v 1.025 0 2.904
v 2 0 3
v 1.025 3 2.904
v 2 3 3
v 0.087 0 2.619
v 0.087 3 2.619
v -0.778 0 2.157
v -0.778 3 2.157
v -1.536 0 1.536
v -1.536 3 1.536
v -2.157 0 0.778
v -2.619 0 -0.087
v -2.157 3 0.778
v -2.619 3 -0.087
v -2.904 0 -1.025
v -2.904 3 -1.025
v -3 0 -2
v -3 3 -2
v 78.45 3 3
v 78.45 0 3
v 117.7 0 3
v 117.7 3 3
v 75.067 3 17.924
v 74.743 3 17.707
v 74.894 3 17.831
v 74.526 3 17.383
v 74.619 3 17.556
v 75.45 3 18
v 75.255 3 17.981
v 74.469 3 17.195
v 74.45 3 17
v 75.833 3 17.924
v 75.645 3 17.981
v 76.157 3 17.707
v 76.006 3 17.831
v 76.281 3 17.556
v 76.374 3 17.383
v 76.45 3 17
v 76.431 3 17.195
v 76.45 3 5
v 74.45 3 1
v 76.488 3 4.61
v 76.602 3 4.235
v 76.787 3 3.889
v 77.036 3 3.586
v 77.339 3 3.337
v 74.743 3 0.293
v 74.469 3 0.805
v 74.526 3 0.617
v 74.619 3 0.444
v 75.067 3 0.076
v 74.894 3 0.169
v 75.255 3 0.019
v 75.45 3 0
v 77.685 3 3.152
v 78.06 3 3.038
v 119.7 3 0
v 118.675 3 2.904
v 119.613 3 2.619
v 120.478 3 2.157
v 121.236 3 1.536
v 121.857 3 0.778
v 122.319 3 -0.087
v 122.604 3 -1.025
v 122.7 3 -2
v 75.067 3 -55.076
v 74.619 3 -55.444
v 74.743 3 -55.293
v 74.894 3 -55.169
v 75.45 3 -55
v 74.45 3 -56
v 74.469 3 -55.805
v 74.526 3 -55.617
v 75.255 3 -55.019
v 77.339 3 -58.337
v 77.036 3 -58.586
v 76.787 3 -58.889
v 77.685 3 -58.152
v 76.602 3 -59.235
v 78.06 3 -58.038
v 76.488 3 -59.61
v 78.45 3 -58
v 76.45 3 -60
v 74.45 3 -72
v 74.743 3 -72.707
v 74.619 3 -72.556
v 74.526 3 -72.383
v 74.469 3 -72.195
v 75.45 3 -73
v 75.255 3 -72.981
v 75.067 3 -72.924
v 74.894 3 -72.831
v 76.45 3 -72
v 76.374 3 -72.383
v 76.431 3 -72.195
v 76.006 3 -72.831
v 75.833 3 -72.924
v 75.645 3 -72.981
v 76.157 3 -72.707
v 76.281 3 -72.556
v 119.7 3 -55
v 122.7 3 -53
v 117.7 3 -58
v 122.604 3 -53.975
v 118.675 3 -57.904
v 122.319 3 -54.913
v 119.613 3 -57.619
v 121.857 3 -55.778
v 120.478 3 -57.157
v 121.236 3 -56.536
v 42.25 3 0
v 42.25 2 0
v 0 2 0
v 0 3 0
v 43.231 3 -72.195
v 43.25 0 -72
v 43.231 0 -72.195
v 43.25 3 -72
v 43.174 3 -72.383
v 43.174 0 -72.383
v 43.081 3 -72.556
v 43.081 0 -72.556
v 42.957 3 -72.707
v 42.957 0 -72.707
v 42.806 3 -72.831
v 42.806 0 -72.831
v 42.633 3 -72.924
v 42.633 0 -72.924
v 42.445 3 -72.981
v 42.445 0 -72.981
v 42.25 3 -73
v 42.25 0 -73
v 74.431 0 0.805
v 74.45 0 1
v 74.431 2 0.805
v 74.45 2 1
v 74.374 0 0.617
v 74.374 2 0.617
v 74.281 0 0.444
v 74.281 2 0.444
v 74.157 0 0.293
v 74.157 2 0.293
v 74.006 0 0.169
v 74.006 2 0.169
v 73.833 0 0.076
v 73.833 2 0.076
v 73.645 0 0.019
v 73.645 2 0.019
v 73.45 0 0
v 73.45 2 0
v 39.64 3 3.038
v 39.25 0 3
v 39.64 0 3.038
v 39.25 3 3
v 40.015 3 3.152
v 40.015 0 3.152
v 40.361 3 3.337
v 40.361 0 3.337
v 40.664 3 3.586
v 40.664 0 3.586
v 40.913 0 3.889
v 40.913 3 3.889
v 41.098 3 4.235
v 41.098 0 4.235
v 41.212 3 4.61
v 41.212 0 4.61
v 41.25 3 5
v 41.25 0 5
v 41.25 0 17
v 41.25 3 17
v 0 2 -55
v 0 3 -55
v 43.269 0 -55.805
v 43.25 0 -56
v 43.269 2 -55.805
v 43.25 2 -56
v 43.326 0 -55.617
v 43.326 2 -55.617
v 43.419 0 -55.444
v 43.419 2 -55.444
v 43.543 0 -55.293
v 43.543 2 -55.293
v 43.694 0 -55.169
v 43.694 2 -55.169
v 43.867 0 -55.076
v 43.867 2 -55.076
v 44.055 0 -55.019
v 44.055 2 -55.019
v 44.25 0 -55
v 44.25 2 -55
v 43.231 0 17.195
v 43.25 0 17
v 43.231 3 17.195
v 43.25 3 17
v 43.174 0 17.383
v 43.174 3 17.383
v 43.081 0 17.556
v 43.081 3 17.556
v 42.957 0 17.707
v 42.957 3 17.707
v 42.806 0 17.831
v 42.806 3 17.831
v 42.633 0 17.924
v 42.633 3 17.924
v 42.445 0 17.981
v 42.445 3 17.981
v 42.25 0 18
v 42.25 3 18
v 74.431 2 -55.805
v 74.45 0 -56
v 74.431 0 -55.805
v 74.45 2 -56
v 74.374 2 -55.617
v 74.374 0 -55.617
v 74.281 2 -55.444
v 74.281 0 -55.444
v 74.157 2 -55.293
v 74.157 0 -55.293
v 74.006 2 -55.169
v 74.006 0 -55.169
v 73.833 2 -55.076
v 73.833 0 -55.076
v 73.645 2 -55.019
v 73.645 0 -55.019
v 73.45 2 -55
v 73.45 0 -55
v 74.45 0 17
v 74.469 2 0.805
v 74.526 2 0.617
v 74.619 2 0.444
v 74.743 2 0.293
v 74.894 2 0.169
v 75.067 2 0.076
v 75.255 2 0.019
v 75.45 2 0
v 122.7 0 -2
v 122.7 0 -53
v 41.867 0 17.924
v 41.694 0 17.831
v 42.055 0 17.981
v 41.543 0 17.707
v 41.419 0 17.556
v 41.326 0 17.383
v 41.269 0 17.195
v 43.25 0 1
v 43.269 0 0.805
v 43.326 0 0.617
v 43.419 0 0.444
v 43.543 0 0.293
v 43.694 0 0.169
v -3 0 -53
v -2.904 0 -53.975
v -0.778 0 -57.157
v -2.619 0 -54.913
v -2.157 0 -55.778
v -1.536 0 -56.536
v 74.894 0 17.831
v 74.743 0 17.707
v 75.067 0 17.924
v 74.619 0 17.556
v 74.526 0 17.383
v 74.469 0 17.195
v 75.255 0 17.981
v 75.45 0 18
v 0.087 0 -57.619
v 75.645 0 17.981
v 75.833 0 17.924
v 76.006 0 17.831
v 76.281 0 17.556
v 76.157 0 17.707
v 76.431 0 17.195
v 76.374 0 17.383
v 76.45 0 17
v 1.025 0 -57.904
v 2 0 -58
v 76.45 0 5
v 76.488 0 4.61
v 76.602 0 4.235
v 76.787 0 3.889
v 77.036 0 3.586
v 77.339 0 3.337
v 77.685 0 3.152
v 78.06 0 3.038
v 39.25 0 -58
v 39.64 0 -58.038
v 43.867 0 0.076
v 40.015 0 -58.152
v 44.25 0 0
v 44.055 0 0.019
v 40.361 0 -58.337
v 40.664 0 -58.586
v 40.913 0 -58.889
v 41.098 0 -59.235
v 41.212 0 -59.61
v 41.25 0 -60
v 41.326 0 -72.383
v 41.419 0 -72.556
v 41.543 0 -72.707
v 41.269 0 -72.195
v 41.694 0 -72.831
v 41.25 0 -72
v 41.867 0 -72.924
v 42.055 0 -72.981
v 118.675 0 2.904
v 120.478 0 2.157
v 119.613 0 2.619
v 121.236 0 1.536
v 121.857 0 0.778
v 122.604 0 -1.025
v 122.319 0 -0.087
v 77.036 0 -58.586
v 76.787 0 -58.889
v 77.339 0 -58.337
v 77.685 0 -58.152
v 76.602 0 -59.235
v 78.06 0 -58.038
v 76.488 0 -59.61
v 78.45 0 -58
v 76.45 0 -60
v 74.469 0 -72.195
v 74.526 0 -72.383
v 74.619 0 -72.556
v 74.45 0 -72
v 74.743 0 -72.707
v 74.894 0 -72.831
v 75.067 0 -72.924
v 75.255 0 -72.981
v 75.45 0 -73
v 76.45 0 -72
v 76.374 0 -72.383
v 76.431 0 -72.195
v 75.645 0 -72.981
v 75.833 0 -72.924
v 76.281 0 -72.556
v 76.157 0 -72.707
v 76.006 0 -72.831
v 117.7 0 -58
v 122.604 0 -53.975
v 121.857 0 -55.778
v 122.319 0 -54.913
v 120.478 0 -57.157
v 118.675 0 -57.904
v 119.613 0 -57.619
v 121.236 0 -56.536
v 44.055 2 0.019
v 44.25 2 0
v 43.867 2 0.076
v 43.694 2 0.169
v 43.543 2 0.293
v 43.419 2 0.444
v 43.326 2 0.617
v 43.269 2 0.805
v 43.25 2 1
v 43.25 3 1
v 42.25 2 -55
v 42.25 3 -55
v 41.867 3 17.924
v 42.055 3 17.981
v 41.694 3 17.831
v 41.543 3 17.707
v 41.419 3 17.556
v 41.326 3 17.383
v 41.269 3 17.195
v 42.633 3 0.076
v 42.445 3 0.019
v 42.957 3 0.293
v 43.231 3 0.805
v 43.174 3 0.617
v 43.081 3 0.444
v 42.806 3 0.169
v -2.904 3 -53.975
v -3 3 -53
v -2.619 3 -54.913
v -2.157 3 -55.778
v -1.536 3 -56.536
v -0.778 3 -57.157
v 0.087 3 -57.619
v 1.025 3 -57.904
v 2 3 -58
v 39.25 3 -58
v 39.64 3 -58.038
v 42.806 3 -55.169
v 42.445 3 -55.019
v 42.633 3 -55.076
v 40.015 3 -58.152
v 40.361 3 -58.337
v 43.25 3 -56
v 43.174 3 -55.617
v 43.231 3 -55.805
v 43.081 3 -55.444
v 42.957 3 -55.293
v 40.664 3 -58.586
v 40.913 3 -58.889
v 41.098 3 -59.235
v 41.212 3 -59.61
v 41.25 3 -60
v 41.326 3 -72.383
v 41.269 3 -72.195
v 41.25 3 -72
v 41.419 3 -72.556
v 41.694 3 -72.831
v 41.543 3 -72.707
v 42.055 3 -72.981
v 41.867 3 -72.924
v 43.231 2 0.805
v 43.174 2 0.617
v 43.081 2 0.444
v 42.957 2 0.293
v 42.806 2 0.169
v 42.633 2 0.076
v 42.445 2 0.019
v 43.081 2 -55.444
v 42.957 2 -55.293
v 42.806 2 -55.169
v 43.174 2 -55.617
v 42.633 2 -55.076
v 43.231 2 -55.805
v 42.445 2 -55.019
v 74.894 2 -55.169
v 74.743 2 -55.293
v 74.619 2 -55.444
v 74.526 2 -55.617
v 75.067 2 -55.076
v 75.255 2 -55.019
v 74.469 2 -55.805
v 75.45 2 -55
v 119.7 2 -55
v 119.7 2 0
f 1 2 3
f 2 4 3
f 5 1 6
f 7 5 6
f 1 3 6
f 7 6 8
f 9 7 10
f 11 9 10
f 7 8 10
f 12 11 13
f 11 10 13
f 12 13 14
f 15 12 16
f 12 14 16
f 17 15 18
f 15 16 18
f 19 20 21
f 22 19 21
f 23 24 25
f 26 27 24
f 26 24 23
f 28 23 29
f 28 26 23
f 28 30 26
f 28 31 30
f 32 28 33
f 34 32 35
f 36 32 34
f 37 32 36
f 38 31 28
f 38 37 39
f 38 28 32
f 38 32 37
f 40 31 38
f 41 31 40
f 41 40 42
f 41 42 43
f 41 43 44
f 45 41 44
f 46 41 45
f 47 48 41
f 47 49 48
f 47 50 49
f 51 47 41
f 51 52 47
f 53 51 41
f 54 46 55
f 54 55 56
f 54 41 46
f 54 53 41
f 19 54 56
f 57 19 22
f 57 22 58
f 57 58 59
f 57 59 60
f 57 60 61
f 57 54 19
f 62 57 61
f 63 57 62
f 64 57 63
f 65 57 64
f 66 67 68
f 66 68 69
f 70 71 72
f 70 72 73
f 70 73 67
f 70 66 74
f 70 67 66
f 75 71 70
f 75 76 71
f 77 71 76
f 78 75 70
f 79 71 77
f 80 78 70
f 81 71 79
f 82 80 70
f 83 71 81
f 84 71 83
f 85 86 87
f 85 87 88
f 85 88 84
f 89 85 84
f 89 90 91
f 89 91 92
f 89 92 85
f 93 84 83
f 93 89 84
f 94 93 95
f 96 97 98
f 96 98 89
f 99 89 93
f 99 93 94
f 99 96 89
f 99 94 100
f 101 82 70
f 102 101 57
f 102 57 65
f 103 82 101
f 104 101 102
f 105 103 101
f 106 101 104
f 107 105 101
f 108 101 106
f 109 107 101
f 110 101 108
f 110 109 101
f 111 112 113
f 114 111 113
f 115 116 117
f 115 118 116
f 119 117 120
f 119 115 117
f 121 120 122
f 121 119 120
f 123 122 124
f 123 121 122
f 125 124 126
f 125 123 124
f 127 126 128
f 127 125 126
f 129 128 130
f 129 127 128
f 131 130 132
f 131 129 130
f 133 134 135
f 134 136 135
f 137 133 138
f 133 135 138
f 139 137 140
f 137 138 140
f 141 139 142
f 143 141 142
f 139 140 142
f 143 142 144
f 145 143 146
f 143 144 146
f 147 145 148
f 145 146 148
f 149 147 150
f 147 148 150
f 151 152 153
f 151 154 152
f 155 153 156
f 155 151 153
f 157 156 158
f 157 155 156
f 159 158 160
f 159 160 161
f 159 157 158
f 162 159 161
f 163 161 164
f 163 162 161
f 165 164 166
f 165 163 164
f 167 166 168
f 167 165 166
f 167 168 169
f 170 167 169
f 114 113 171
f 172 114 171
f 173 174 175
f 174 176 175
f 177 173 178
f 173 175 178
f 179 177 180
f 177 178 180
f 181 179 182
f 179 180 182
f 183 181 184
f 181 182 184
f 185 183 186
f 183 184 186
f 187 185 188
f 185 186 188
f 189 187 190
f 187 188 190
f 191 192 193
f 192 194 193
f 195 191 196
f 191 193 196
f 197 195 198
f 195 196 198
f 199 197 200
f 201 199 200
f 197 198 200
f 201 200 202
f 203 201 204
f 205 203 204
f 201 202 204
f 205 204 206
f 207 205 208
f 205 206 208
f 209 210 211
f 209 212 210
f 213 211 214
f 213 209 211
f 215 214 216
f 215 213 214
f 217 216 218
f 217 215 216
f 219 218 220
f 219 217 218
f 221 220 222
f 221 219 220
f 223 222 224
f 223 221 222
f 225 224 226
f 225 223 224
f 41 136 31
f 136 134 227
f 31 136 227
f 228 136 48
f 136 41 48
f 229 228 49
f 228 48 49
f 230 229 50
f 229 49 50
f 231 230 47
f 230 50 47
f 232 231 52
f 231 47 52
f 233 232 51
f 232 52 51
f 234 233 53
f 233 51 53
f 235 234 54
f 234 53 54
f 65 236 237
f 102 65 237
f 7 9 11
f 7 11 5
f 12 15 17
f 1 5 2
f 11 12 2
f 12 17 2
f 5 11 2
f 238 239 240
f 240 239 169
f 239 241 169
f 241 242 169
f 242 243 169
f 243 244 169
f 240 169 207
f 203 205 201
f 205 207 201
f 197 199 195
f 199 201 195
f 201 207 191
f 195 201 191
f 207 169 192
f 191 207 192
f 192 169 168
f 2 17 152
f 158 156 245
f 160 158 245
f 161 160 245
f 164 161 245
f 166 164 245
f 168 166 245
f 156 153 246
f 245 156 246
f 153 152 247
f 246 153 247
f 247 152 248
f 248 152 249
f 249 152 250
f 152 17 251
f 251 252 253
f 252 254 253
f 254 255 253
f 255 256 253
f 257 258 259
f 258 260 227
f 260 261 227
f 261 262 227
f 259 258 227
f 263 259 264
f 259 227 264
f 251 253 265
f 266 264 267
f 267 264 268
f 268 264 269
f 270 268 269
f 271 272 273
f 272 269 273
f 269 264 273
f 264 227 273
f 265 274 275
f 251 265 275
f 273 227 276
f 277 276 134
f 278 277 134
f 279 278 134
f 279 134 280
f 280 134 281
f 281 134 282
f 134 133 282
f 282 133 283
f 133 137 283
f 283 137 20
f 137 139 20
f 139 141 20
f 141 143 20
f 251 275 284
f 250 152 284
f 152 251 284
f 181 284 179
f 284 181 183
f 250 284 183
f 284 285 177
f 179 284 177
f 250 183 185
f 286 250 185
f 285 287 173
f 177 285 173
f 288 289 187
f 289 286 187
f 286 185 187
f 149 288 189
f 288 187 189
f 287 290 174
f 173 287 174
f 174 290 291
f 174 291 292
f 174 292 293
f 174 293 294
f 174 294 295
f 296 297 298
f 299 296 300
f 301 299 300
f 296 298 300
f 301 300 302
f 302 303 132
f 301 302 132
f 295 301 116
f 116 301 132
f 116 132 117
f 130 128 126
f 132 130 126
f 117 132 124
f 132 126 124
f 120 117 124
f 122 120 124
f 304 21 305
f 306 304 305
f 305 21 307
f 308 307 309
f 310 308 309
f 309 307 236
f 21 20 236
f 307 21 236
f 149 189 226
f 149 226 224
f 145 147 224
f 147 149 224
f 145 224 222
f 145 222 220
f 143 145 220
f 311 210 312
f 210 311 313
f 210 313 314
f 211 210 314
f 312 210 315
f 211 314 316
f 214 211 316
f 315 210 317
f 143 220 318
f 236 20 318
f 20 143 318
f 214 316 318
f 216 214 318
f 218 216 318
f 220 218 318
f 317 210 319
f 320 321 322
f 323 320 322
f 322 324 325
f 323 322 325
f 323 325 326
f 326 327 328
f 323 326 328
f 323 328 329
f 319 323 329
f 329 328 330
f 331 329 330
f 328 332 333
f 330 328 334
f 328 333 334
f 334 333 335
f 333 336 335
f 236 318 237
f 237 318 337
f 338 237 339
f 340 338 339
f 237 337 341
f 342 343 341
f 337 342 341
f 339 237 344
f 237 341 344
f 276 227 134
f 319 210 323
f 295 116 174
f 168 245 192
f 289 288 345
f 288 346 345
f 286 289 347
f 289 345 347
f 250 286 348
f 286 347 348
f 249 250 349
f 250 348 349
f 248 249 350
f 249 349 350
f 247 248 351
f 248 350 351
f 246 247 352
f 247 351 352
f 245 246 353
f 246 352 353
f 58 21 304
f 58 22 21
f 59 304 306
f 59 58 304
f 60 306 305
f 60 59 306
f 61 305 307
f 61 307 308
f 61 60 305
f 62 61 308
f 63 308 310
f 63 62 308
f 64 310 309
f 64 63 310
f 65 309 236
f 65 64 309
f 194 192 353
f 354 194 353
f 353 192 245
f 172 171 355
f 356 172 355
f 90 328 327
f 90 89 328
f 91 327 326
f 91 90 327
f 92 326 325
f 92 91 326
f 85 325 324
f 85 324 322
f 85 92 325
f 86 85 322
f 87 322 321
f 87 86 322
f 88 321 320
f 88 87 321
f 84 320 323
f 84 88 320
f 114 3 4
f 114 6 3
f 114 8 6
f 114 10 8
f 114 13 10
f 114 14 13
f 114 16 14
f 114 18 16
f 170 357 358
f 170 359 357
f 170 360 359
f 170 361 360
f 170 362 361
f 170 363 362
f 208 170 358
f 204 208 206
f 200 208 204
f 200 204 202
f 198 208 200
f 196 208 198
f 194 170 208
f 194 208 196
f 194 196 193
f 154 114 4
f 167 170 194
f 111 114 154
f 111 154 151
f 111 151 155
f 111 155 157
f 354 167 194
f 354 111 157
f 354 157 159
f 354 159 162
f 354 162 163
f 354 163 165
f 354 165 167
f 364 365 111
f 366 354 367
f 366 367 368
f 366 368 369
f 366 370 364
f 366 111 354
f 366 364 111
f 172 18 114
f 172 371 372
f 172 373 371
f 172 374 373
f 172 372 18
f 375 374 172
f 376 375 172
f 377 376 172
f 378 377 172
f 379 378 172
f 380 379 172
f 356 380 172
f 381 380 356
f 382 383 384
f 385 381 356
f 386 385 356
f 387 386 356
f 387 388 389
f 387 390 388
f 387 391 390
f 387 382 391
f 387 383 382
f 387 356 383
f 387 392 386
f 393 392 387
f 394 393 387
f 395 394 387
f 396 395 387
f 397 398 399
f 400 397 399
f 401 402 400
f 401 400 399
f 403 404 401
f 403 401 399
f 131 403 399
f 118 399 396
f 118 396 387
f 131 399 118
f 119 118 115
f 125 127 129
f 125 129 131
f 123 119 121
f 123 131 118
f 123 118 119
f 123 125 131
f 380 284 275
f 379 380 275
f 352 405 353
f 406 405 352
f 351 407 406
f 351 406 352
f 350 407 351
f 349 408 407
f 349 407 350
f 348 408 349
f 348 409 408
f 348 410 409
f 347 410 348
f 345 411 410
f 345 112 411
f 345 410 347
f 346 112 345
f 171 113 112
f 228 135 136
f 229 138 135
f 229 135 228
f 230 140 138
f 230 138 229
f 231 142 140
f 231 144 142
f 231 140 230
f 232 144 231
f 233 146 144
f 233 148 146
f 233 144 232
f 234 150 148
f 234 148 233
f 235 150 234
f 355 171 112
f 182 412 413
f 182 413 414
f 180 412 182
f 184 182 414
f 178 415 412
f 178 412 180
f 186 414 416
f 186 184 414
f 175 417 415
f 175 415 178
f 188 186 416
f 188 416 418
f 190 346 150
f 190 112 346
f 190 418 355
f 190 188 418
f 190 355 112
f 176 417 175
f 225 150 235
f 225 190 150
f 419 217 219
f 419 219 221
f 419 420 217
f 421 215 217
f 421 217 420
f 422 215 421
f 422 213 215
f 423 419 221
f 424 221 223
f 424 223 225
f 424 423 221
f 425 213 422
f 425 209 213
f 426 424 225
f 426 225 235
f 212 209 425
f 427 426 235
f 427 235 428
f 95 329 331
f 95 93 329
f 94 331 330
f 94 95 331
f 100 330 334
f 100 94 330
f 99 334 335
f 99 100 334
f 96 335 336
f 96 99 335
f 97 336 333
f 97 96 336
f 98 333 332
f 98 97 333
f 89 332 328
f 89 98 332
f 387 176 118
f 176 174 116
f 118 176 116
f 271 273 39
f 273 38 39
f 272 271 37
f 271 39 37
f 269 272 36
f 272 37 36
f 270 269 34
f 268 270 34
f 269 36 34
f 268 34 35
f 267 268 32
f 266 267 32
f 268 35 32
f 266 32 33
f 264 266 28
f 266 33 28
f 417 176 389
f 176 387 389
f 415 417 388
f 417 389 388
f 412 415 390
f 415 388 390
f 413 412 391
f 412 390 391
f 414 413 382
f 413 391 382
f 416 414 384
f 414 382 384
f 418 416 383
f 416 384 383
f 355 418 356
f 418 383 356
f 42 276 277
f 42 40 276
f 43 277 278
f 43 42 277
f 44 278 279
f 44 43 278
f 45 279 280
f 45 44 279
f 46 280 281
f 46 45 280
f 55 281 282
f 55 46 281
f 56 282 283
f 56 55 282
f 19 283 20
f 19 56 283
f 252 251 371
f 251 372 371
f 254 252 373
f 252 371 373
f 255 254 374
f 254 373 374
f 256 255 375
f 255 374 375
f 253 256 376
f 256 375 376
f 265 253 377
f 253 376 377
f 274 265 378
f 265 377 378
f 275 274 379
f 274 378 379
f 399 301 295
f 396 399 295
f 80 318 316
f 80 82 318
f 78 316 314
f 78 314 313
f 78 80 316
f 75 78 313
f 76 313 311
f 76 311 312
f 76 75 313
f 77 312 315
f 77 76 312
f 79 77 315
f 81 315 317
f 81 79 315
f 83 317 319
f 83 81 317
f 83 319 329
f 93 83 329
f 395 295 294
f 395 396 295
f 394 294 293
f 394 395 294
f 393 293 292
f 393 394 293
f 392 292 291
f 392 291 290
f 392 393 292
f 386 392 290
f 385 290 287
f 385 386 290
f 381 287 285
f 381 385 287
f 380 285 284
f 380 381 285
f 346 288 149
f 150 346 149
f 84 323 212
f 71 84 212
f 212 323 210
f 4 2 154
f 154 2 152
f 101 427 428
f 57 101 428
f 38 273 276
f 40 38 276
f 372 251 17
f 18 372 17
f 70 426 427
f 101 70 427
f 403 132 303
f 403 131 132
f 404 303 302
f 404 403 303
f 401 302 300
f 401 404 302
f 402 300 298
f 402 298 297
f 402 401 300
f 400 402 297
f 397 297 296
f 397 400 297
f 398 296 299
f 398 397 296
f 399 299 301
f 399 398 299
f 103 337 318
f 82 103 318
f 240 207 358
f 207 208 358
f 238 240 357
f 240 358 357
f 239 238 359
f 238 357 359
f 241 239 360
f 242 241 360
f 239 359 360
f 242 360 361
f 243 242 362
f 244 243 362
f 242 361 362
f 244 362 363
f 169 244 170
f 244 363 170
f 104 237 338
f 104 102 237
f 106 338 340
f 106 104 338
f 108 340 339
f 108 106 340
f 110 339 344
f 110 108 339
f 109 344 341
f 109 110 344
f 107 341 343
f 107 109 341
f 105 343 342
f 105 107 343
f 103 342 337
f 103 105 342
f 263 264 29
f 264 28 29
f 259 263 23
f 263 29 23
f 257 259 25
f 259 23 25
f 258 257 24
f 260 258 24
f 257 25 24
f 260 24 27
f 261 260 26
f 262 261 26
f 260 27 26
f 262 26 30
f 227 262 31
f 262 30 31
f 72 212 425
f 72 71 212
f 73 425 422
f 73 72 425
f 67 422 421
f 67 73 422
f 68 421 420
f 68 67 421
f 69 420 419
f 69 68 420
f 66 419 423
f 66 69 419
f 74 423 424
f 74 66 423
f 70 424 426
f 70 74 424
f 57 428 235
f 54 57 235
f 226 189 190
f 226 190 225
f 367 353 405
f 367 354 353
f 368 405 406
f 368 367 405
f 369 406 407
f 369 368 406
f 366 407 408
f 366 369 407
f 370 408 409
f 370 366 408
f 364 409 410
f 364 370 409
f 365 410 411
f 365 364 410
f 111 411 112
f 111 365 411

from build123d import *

# Parameters (mm, degrees)
BOSS_EXTRUDE3_DEPTH   = 3
BOSS_EXTRUDE3_2_DEPTH = 3
SKETCH2_W             = 119.7
SKETCH2_H             = 55
BOSS_EXTRUDE4_DEPTH   = 2
FILLET5_R             = 2
FILLET6_R             = 5
FILLET7_R             = 1
FILLET8_R             = 1
FILLET9_R             = 1


with BuildPart() as part:
    # Sketch1 → Boss-Extrude3 (new body)
    with BuildSketch(Plane(origin=(0, 0, 0), x_dir=(1, 0, 0), z_dir=(0, 1, 0))):
        Polygon((119.7, 0), (74.45, 0), (74.45, -3), (74.45, -18), (76.45, -18), (76.45, -3), (122.7, -3), (122.7, 58), (76.45, 58), (76.45, 73), (74.45, 73), (74.45, 58), (74.45, 55), (119.7, 55), align=None)
    extrude(amount=BOSS_EXTRUDE3_DEPTH)



with BuildPart() as body_2:
    # Sketch1 → Boss-Extrude3 2 (new body)
    with BuildSketch(Plane(origin=(0, 0, 0), x_dir=(1, 0, 0), z_dir=(0, 1, 0))):
        Polygon((-3, 58), (-3, -3), (41.25, -3), (41.25, -18), (43.25, -18), (43.25, -3), (43.25, 0), (0, 0), (0, 55), (43.25, 55), (43.25, 58), (43.25, 73), (41.25, 73), (41.25, 58), align=None)
    extrude(amount=BOSS_EXTRUDE3_2_DEPTH)


with BuildPart() as part_1:
    add(part.part)

    add(body_2.part)  # Boss-Extrude4 merges body 2
    # Sketch2 → Boss-Extrude4 (add)
    with BuildSketch(Plane(origin=(0, 0, 0), x_dir=(1, 0, 0), z_dir=(0, 1, 0))):
        with Locations((59.85, 27.5)):
            Rectangle(SKETCH2_W, SKETCH2_H)
    extrude(amount=BOSS_EXTRUDE4_DEPTH)

    # Fillet5
    fillet5_edges = [part_1.edges().sort_by_distance(p)[0] for p in [
        (76.45, 1.5, -58),
        (76.45, 1.5, 3),
        (41.25, 1.5, -58),
        (41.25, 1.5, 3),
    ]]
    fillet(fillet5_edges, radius=FILLET5_R)

    # Fillet6
    fillet6_edges = [part_1.edges().sort_by_distance(p)[0] for p in [
        (122.7, 1.5, -58),
        (122.7, 1.5, 3),
        (-3, 1.5, -58),
        (-3, 1.5, 3),
    ]]
    fillet(fillet6_edges, radius=FILLET6_R)

    # Fillet7
    fillet7_edges = [part_1.edges().sort_by_distance(p)[0] for p in [
        (74.45, 1.5, 18),
        (76.45, 1.5, 18),
        (43.25, 1.5, 18),
        (41.25, 1.5, 18),
        (41.25, 1.5, -73),
        (43.25, 1.5, -73),
        (74.45, 1.5, -73),
        (76.45, 1.5, -73),
    ]]
    fillet(fillet7_edges, radius=FILLET7_R - 0.0001)  # a hair under: the kernel refuses the full size

    # Fillet8
    fillet8_edges = [part_1.edges().sort_by_distance(p)[0] for p in [
        (74.45, 2.5, -55),
        (74.45, 2.5, 0),
        (43.25, 2.5, 0),
        (43.25, 2.5, -55),
    ]]
    fillet(fillet8_edges, radius=FILLET8_R)

    # Fillet9
    fillet9_edges = [part_1.edges().sort_by_distance(p)[0] for p in [
        (43.25, 1, -55),
        (74.45, 1, -55),
        (74.45, 1, 0),
        (43.25, 1, 0),
    ]]
    fillet(fillet9_edges, radius=FILLET9_R)


solid = part_1.part
